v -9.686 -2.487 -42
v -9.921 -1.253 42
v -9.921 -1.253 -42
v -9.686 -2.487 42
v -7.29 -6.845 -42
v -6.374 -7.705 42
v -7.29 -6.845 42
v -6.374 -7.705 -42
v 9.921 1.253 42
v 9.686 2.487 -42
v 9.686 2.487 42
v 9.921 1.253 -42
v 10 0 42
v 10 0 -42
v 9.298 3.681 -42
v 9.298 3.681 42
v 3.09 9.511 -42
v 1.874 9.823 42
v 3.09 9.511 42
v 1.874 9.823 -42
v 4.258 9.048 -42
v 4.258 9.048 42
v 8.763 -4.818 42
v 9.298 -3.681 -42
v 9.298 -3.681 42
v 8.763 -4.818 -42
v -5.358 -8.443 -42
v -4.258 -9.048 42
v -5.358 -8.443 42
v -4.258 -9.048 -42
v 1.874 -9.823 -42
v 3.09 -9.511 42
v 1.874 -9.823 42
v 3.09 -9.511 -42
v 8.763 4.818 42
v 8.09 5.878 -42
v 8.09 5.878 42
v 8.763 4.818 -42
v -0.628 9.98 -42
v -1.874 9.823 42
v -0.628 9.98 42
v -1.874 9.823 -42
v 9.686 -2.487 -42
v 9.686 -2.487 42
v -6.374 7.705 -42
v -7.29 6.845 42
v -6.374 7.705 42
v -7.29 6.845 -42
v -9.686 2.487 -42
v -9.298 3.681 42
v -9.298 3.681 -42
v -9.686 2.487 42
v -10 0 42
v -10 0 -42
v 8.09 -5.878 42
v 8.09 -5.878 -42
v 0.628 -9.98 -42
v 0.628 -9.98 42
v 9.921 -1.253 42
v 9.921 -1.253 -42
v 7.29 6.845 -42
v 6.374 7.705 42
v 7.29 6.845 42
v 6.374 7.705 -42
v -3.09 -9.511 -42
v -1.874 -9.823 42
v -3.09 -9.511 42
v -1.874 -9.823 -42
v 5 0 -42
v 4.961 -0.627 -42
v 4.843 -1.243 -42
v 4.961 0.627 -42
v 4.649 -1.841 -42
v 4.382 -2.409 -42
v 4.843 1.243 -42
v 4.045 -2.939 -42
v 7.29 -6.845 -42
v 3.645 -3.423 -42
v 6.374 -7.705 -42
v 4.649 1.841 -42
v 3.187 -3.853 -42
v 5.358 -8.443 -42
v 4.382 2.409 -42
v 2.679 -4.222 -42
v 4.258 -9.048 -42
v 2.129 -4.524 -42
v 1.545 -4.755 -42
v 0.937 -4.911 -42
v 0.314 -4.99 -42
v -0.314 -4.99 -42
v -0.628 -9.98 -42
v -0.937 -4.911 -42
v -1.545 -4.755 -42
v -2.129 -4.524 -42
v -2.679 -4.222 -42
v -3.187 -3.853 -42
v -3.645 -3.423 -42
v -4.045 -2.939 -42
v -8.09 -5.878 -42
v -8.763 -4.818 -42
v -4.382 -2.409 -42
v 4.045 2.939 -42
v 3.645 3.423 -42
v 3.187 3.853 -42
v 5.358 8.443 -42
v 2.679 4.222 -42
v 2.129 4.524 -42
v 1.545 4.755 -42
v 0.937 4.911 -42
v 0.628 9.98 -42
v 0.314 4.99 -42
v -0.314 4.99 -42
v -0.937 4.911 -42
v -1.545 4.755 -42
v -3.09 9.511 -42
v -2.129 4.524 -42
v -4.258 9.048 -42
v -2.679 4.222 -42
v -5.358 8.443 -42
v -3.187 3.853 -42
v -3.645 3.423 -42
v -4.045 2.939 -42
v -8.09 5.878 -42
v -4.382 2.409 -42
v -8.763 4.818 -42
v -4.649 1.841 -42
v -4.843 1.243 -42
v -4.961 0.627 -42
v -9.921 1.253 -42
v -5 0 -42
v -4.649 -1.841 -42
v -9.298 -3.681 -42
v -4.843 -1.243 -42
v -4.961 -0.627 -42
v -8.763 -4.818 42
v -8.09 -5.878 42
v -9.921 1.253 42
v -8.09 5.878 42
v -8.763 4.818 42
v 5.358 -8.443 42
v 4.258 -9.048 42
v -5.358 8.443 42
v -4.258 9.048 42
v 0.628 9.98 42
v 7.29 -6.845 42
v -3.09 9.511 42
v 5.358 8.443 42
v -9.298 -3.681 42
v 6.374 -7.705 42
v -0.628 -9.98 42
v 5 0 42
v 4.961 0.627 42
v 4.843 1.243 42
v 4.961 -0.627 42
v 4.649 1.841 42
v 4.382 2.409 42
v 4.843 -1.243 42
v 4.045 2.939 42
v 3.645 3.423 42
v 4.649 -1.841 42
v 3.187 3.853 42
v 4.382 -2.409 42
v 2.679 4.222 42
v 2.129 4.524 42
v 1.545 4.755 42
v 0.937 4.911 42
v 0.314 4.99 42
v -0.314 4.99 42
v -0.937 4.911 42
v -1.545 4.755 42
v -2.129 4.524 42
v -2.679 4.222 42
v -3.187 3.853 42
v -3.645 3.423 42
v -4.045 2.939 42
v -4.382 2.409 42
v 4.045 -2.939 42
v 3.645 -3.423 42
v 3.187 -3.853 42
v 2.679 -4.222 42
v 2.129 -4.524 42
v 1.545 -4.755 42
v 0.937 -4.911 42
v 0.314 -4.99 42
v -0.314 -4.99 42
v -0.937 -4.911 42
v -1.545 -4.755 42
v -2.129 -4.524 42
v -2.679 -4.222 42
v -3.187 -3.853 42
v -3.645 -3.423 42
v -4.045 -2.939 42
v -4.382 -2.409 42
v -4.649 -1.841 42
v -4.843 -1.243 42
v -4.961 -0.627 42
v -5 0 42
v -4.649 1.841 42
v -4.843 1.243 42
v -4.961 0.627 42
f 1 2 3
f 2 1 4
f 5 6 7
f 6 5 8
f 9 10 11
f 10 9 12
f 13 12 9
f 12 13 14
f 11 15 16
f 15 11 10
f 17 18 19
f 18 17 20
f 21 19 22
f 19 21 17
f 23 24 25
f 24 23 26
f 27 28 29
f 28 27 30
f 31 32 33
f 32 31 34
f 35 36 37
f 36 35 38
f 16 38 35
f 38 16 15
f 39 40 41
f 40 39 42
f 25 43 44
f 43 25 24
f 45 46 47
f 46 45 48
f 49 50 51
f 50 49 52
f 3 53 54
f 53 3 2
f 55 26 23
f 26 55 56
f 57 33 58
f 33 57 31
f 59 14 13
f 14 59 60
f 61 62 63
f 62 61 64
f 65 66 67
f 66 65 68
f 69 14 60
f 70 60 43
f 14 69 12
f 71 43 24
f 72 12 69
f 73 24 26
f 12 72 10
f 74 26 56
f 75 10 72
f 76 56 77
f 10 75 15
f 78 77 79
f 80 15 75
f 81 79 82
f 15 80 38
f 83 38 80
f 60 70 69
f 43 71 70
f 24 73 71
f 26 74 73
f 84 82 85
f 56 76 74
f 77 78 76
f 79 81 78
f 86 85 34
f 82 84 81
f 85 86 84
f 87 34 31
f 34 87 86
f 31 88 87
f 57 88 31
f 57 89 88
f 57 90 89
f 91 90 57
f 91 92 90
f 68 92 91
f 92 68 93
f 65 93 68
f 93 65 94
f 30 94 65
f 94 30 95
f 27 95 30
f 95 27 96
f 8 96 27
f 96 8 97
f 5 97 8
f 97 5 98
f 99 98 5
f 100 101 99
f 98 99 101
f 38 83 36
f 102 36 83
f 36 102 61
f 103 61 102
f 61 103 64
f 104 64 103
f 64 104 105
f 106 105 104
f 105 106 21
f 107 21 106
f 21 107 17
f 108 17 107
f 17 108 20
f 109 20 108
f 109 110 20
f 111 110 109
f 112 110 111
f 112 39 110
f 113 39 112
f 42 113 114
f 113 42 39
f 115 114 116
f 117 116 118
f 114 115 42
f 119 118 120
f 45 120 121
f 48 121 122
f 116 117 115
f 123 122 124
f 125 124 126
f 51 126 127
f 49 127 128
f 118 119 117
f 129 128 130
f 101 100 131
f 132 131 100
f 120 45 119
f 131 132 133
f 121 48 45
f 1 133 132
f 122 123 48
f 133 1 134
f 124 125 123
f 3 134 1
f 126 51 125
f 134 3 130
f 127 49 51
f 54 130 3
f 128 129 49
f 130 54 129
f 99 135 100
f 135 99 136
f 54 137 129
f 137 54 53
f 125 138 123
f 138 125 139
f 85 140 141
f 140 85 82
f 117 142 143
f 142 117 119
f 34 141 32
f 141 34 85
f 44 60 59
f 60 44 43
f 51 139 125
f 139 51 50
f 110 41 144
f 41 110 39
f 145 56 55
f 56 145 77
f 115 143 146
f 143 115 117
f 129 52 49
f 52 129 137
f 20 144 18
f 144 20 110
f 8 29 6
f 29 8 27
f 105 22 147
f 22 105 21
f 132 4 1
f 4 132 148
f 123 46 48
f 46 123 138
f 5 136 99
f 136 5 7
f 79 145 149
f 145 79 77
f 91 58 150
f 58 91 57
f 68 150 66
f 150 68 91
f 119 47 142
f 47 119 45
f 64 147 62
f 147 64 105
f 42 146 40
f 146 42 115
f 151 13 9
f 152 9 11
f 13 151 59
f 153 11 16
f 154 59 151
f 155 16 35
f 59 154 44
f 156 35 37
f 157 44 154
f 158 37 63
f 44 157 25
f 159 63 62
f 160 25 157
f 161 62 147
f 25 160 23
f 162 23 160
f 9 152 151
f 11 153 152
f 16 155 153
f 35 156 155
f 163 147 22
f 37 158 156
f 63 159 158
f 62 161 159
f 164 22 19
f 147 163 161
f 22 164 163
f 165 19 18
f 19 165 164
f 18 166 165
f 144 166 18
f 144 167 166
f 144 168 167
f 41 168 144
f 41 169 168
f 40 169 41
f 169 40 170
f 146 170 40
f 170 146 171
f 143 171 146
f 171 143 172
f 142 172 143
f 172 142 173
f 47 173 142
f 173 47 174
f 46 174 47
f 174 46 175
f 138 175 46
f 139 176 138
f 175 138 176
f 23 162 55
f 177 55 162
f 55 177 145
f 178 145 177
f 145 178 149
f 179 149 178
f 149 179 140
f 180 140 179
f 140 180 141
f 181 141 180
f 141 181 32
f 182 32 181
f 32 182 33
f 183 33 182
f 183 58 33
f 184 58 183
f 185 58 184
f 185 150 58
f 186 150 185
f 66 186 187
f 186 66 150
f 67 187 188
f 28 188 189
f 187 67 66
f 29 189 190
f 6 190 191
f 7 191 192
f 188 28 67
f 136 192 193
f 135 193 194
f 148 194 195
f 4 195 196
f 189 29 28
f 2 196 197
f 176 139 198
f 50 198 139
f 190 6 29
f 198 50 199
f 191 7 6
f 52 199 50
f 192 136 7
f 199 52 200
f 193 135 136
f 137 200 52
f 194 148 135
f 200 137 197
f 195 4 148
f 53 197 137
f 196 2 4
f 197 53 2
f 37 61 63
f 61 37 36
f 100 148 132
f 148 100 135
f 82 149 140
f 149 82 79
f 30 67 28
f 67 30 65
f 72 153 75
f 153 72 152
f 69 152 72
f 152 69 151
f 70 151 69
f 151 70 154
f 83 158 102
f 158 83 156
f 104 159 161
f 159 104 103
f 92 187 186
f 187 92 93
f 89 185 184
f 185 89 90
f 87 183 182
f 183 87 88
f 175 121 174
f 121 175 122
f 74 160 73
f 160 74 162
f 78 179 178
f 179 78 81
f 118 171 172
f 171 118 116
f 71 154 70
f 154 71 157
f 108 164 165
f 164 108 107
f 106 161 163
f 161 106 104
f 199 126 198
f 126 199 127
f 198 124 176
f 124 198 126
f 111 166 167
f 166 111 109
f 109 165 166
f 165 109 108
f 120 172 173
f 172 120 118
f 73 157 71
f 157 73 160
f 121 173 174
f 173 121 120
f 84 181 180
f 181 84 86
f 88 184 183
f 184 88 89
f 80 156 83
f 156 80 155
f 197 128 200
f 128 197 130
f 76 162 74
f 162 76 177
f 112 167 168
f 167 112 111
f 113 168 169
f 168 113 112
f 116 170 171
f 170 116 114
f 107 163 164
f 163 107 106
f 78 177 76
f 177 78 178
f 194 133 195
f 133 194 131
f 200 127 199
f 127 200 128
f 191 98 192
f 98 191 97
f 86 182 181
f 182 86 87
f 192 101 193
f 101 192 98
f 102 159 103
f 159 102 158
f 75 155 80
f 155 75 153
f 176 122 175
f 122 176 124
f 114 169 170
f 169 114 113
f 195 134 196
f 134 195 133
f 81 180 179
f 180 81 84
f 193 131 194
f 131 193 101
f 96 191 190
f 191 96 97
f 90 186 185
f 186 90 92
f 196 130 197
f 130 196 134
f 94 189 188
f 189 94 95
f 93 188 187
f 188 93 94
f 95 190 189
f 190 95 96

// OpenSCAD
$fn = 50;


difference() {
	union() {
		translate(v = [0, 0, -42.0000000000]) {
			cylinder(h = 84, r = 10.0000000000);
		}
	}
	union() {
		translate(v = [0, 0, -100.0000000000]) {
			cylinder(h = 200, r = 5.0000000000);
		}
	}
}
